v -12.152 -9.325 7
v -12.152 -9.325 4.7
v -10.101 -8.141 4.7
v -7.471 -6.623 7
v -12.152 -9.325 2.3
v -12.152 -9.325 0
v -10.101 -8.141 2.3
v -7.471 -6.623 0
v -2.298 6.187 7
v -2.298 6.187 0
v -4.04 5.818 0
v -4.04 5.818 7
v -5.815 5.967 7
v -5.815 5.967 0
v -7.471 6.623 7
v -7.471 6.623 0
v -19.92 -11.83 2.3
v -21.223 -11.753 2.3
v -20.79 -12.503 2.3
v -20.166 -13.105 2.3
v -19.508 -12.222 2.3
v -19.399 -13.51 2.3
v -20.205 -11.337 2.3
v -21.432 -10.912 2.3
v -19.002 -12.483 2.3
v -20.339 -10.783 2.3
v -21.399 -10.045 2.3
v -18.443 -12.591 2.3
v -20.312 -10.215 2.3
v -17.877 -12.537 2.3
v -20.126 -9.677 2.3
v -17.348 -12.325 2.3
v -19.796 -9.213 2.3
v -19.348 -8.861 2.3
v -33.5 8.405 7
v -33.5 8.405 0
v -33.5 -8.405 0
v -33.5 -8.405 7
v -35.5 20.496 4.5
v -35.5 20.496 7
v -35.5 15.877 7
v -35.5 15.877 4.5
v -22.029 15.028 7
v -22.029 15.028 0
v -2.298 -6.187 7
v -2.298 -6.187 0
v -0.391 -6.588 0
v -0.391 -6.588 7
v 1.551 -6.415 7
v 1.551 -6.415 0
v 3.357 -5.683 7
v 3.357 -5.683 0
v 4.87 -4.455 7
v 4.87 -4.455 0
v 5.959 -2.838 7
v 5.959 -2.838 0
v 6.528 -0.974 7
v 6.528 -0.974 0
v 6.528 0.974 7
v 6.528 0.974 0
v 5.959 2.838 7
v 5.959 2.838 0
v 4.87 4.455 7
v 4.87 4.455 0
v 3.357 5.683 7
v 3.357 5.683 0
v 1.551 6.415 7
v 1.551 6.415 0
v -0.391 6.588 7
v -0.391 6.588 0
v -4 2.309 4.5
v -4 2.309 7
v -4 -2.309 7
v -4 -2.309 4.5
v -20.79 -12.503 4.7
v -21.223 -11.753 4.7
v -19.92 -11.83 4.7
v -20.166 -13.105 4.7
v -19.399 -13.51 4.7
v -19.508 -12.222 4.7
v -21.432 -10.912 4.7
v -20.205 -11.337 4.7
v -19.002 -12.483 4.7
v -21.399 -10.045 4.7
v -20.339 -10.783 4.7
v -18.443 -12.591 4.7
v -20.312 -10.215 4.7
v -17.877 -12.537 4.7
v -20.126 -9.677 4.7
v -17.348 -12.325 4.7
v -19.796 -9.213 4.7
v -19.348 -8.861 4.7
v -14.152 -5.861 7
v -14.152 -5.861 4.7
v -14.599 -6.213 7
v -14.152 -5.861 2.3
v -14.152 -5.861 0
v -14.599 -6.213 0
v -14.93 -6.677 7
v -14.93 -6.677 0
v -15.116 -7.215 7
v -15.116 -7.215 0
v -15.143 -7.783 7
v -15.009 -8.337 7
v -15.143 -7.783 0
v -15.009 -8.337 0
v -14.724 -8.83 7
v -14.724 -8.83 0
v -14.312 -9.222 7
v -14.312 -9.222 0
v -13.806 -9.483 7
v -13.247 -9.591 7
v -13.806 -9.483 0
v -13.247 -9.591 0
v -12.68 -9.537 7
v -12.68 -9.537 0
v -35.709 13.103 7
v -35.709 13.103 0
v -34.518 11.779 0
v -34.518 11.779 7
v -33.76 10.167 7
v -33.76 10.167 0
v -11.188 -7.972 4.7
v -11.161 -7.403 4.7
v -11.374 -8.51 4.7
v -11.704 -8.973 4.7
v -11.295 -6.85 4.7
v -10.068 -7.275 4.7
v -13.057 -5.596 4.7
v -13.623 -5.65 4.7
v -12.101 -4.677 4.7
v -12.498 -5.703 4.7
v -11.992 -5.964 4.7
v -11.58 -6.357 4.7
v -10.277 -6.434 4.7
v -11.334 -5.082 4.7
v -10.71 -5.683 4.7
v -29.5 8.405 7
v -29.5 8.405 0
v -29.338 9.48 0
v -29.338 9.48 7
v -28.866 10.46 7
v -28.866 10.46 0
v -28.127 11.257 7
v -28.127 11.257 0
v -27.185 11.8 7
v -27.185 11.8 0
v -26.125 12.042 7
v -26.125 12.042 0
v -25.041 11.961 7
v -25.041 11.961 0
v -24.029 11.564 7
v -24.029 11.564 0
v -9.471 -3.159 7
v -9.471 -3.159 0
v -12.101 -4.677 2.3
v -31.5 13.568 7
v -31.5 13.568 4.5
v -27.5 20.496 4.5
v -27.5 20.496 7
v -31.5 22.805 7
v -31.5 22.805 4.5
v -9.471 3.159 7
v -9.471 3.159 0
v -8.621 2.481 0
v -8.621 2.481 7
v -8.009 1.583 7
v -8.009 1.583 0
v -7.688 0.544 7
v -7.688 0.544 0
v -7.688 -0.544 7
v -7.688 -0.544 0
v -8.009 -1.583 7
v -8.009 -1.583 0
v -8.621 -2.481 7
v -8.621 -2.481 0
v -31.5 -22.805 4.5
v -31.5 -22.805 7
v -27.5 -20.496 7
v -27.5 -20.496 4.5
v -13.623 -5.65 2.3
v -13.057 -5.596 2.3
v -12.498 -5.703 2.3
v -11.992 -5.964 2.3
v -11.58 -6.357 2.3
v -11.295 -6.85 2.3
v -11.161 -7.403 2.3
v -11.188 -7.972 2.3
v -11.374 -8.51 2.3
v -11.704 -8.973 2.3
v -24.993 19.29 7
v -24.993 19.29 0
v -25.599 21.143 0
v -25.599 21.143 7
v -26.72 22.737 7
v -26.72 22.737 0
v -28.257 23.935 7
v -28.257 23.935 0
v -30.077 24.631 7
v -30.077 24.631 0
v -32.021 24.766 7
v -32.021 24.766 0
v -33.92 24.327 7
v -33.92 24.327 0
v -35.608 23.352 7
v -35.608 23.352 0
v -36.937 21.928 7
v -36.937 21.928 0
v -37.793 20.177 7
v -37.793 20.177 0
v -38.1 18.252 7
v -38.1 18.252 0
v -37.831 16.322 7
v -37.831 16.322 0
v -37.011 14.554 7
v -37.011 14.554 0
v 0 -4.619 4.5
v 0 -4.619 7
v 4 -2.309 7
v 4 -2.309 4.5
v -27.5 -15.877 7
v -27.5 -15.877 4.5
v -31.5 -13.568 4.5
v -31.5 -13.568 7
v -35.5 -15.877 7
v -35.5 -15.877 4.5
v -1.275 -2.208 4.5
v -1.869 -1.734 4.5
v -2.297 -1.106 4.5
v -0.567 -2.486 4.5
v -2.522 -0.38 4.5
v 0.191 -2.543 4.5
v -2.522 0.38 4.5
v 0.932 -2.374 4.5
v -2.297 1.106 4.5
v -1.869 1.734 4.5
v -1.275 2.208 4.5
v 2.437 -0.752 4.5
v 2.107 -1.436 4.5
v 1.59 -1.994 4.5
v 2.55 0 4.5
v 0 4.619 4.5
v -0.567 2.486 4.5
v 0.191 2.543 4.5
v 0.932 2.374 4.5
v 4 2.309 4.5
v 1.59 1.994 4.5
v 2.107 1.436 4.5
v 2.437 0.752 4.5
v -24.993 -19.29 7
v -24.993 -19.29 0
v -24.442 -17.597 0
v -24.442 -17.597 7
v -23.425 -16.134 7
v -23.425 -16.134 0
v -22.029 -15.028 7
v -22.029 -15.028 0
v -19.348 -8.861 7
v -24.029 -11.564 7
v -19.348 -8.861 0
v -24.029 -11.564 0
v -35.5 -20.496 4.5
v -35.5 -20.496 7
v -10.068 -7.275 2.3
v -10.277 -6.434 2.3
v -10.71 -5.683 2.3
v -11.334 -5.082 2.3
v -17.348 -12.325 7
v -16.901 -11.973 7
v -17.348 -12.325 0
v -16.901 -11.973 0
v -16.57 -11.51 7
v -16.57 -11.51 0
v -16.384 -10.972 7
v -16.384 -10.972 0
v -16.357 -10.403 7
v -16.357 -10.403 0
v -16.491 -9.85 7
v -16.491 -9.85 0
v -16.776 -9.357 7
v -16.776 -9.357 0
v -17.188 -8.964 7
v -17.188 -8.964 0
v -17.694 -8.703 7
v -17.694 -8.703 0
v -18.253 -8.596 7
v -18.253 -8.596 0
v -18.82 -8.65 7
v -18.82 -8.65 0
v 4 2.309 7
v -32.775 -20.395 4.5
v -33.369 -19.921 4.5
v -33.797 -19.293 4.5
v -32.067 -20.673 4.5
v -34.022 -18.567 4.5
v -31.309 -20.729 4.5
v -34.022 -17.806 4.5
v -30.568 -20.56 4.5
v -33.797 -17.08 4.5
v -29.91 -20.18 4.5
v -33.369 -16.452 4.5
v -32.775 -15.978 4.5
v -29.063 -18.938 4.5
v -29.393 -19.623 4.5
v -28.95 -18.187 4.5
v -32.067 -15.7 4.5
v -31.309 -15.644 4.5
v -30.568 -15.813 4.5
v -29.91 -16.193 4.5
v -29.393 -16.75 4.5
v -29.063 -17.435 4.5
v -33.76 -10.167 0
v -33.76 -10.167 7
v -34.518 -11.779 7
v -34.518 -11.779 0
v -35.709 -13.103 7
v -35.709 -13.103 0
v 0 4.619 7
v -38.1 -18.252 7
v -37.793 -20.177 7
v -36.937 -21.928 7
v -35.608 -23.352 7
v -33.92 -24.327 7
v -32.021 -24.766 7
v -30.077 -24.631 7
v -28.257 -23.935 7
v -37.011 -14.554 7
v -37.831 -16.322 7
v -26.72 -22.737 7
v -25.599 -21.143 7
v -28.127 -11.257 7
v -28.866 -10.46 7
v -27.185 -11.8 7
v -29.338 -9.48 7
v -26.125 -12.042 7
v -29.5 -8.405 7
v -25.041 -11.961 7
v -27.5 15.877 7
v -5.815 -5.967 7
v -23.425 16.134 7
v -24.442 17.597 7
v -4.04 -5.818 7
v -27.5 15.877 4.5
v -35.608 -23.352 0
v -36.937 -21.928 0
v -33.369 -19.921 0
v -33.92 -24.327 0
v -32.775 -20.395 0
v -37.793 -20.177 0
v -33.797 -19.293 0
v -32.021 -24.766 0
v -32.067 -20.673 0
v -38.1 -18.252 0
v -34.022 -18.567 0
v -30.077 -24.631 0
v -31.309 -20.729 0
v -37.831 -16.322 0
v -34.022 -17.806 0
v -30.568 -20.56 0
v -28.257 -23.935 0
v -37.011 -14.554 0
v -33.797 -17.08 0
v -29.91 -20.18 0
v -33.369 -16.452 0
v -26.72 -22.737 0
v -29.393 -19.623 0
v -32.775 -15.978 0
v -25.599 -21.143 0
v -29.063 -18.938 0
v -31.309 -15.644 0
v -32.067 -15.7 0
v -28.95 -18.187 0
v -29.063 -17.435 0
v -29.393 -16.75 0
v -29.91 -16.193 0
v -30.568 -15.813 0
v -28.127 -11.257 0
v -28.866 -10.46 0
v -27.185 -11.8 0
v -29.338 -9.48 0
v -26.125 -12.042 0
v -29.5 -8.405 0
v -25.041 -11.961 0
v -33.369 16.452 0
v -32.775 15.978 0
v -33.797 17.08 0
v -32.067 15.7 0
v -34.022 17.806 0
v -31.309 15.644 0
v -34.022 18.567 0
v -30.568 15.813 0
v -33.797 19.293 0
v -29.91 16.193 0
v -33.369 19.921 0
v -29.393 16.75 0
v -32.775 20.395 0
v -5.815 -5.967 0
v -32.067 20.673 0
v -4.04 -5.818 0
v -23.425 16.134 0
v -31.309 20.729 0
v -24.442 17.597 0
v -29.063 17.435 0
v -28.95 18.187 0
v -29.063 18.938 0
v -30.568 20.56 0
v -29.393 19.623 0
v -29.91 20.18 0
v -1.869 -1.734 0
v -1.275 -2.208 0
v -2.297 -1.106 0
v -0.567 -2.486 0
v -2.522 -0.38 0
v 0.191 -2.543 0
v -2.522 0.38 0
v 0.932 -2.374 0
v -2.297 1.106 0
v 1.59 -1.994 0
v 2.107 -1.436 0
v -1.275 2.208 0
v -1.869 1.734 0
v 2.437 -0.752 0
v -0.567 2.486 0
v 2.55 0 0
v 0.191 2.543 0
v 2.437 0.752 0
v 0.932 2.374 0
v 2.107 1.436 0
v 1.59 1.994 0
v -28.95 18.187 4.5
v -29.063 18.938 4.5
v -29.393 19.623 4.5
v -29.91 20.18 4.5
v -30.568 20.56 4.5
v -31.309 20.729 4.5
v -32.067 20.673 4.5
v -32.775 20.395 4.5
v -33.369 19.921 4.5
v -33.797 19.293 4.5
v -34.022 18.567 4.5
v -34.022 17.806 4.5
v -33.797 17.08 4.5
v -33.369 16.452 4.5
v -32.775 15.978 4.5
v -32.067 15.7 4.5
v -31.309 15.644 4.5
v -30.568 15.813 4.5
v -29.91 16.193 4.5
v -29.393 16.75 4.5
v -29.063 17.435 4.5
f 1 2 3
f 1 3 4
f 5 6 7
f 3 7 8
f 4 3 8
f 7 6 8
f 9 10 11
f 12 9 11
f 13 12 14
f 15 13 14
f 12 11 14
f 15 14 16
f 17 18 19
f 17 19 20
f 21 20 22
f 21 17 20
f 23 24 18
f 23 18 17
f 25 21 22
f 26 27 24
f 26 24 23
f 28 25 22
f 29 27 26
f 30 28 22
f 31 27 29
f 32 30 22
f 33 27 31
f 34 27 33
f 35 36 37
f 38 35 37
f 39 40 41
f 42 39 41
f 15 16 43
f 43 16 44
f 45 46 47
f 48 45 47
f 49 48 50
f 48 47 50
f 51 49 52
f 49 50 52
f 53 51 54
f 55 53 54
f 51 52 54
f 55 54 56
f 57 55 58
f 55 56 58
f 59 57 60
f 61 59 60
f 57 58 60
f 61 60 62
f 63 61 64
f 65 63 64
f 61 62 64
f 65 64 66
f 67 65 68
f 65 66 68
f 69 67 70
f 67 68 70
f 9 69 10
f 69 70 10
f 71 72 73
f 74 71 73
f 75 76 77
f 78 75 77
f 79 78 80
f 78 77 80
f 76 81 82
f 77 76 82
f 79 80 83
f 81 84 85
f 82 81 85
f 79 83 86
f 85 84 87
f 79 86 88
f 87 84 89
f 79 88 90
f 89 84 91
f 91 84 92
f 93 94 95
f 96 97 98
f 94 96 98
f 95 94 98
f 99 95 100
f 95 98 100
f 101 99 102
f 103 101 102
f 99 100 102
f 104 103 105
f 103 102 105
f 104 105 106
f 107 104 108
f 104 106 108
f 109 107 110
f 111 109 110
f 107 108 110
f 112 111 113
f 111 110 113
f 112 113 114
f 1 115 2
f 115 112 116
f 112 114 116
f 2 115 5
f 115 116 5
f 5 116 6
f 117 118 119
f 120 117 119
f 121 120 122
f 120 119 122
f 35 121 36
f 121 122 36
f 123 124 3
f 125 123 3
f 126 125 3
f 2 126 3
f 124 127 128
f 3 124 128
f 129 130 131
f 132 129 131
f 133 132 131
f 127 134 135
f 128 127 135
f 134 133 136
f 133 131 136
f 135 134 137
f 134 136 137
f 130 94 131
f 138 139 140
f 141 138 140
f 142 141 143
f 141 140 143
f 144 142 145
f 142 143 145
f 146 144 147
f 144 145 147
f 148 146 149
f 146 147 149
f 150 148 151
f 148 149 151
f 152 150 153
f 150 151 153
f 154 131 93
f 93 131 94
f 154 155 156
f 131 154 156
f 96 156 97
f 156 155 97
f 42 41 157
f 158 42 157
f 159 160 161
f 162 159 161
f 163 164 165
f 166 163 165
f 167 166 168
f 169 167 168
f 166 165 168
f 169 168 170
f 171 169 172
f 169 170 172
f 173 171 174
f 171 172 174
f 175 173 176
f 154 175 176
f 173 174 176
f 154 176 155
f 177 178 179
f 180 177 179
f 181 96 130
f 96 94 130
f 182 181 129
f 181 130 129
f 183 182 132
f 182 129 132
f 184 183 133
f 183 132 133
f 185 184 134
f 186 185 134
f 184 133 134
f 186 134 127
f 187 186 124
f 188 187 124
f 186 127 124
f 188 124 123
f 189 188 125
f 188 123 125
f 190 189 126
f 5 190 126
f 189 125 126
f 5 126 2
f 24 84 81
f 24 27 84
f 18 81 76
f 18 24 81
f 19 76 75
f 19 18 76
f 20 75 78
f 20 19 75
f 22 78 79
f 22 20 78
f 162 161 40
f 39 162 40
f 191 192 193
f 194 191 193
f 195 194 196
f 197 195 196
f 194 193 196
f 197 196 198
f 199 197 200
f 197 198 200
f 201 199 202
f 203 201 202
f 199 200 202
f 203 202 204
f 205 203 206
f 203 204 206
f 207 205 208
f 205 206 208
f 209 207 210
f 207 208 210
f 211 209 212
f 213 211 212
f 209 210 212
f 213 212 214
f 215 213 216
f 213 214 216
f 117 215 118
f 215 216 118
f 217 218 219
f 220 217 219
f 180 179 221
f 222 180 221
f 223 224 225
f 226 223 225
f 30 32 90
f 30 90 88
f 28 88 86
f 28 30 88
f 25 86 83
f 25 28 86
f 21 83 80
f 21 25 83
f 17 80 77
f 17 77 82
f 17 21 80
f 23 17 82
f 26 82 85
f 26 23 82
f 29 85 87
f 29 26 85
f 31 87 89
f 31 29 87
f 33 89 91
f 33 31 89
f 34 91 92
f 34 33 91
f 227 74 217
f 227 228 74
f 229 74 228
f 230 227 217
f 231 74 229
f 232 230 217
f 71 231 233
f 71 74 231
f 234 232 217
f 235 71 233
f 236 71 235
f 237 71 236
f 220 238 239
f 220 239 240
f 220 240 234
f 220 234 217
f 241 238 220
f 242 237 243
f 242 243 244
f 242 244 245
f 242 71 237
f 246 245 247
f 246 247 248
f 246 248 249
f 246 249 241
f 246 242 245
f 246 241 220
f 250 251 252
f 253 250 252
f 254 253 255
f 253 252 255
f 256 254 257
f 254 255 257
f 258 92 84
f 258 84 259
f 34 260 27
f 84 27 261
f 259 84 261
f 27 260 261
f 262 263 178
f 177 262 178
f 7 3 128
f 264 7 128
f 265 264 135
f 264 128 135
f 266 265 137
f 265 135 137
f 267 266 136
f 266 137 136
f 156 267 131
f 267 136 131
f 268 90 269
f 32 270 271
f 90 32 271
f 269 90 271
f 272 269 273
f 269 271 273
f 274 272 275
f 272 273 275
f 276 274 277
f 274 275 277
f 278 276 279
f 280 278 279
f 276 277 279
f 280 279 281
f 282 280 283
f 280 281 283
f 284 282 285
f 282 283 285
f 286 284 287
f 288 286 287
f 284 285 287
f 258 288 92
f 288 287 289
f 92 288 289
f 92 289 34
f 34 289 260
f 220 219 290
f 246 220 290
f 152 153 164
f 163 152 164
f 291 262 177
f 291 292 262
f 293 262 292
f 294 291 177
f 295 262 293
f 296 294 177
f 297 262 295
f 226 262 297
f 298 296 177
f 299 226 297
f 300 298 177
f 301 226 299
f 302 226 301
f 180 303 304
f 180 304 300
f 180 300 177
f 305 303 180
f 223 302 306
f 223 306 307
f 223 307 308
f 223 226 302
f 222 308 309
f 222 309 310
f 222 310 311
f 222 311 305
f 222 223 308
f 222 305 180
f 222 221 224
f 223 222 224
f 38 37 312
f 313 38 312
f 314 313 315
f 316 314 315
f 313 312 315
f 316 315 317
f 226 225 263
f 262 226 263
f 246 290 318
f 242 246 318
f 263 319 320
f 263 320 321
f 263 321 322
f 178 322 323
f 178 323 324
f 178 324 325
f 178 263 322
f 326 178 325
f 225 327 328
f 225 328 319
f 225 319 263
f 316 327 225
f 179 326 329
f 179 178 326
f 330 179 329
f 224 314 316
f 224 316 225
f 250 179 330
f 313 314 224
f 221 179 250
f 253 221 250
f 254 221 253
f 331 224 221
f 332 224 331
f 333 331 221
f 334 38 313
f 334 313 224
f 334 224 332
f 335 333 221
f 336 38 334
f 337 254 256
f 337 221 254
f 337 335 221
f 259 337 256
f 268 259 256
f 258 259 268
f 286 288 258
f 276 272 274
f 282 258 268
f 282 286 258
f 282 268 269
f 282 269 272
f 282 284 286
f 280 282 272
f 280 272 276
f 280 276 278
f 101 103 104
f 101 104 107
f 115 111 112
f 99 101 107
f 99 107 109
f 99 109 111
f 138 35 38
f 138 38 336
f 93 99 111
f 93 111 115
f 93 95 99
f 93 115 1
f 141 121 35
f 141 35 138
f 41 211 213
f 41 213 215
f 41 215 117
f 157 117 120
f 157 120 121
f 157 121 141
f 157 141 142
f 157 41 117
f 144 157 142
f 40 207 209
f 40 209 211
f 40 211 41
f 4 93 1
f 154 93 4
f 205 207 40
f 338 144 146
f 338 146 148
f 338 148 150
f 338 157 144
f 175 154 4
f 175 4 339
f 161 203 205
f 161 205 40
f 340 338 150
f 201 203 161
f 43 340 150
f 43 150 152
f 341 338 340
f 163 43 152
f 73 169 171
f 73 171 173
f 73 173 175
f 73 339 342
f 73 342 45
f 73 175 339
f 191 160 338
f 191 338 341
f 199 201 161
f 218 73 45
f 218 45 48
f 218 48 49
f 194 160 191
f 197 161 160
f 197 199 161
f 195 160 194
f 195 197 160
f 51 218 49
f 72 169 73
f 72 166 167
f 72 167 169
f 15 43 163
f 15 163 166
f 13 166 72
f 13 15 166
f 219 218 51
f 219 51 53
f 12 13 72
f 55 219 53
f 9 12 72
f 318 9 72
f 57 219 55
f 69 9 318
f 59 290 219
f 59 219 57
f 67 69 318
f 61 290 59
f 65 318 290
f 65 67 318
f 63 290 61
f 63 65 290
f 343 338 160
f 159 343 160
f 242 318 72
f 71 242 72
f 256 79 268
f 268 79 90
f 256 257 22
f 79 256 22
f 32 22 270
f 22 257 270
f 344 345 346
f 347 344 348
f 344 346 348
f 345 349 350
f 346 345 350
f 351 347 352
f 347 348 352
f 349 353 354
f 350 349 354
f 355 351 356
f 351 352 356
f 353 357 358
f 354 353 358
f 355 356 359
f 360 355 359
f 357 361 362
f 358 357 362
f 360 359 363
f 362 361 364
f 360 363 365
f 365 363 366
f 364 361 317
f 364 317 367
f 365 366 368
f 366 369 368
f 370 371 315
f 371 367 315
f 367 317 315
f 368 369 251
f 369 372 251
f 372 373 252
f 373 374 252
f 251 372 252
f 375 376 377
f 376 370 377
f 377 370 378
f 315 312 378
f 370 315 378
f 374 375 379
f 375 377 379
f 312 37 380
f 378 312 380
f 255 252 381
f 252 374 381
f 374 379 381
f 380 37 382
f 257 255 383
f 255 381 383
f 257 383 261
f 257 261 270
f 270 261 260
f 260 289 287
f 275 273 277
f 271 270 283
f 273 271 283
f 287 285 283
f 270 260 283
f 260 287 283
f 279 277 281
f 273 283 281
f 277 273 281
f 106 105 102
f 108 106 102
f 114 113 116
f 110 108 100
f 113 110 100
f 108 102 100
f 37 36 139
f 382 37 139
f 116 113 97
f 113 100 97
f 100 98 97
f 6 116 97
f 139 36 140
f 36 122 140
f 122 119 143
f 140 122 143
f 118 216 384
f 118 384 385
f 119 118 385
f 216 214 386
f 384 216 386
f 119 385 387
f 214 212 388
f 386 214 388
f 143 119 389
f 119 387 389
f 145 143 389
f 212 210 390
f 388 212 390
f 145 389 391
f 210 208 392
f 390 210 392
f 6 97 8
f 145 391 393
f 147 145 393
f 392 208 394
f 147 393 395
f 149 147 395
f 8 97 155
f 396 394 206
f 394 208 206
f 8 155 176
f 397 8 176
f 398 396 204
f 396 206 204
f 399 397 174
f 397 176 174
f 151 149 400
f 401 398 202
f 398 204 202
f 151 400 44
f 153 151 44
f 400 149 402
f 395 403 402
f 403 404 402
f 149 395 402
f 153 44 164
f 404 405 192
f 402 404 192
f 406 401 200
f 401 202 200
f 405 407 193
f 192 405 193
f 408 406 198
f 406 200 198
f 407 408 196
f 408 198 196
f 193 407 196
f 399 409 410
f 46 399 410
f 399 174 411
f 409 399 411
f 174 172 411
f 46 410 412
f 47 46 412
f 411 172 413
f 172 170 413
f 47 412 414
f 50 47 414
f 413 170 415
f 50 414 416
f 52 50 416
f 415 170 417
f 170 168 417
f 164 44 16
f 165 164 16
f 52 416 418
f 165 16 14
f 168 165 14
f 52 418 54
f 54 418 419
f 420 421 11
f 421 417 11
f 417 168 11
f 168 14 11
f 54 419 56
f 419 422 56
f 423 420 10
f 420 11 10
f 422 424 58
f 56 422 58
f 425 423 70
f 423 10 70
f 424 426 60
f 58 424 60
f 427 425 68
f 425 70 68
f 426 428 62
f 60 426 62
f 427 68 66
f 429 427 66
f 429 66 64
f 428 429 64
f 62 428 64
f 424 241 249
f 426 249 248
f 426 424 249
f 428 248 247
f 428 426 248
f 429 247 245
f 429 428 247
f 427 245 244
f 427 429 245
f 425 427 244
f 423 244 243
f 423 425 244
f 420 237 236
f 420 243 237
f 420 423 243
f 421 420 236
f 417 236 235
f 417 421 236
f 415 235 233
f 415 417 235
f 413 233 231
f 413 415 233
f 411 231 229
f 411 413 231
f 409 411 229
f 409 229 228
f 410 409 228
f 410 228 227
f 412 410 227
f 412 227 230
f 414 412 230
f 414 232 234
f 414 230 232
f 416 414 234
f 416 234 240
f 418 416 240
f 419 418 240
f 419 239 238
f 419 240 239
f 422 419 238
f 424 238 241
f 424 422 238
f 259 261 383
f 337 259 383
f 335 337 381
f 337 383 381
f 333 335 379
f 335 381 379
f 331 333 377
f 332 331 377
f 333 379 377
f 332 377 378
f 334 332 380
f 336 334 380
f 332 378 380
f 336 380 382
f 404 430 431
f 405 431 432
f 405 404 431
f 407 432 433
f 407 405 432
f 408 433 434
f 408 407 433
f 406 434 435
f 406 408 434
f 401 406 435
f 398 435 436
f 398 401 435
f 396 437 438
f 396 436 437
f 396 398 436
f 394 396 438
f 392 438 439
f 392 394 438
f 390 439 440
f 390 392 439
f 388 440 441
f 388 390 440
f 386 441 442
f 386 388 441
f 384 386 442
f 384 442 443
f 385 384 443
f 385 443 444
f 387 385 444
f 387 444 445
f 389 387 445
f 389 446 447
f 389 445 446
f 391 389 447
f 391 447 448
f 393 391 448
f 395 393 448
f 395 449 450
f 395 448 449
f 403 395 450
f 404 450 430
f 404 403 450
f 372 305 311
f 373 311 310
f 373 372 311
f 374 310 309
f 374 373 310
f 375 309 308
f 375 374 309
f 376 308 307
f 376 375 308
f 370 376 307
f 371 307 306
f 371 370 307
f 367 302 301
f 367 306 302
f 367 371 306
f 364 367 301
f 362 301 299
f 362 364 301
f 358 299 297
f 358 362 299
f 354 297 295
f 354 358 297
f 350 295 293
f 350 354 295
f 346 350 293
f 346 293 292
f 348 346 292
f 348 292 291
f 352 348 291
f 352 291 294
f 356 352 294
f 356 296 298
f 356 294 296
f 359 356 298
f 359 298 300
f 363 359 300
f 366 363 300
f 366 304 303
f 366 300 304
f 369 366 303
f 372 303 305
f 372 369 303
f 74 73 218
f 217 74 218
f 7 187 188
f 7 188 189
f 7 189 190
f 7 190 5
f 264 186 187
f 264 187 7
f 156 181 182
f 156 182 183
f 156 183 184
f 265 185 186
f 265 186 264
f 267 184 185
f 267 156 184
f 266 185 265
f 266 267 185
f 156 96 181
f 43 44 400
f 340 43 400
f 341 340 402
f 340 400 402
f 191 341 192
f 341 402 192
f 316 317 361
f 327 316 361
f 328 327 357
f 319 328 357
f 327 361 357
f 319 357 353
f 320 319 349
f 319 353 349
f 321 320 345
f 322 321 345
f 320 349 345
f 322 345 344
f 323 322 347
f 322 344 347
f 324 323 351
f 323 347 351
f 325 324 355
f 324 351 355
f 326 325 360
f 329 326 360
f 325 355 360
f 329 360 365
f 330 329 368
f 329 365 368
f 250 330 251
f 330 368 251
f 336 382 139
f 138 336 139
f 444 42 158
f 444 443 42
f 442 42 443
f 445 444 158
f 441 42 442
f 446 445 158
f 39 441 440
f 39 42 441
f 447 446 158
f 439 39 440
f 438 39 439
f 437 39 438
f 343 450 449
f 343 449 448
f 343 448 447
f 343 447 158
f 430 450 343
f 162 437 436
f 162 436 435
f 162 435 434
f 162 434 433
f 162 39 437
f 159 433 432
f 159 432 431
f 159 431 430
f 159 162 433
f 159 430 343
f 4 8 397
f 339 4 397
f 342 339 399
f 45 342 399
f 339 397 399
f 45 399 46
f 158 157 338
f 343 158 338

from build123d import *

# Parameters (mm, degrees)
F0_R     = 2.55
F1_DEPTH = 7
F3_DEPTH = 2.5
F6_DEPTH = 1.2


with BuildPart() as f1:
    # F0 (on Top) → F1 (new body)
    with BuildSketch(Plane.XY):
        with BuildLine():
            ThreePointArc((-22.0288725662, 15.0277765828), (-23.9870436526, 16.827971802), (-24.9929573966, 19.2903434982))
            ThreePointArc((-24.9929573966, 19.2903434982), (-34.8, 23.9023011445), (-35.7094488189, 13.1031742908))
            ThreePointArc((-35.7094488189, 13.1031742908), (-34.0799292484, 11.0008415863), (-33.5, 8.404918071))
            Line((-33.5, 8.404918071), (-33.5, -8.404918071))
            ThreePointArc((-33.5, -8.404918071), (-34.0799292484, -11.0008415863), (-35.7094488189, -13.1031742908))
            ThreePointArc((-35.7094488189, -13.1031742908), (-34.8, -23.9023011445), (-24.9929573966, -19.2903434982))
            ThreePointArc((-24.9929573966, -19.2903434982), (-23.9870430876, -16.8279709896), (-22.0288708522, -15.0277755932))
            Line((-22.0288708522, -15.0277755932), (-17.348076829, -12.3253179039))
            ThreePointArc((-17.348076829, -12.3253179039), (-16.6160260214, -9.5932670963), (-19.348076829, -8.8612162887))
            Line((-19.348076829, -8.8612162887), (-24.0288708522, -11.5636739781))
            ThreePointArc((-24.0288708522, -11.5636739781), (-27.6762899984, -11.5636754624), (-29.5, -8.404918071))
            Line((-29.5, -8.404918071), (-29.5, 8.404918071))
            ThreePointArc((-29.5, 8.404918071), (-27.6762908554, 11.5636749676), (-24.0288725662, 11.5636749676))
            Line((-24.0288725662, 11.5636749676), (-9.4711274338, 3.1587568967))
            ThreePointArc((-9.4711274338, 3.1587568967), (-7.6474182892, -9.615e-07), (-9.4711290992, -3.1587578582))
            Line((-9.4711290992, -3.1587578582), (-14.1519236685, -5.8612158628))
            ThreePointArc((-14.1519236685, -5.8612158628), (-14.8839746302, -8.5932681071), (-12.1519222705, -9.3253186383))
            Line((-12.1519222705, -9.3253186383), (-7.4711290992, -6.6228594733))
            ThreePointArc((-7.4711290992, -6.6228594733), (-4.9330280571, -5.8271302964), (-2.2975937845, -6.1871692074))
            ThreePointArc((-2.2975937845, -6.1871692074), (6.6, 0), (-2.2975937845, 6.1871692074))
            ThreePointArc((-2.2975937845, 6.1871692074), (-4.933027099, 5.8271302157), (-7.4711274338, 6.6228585118))
            Line((-7.4711274338, 6.6228585118), (-22.0288725662, 15.0277765828))
        make_face()
        with Locations((-31.5, -18.1865334795)):
            Circle(F0_R, mode=Mode.SUBTRACT)
        with Locations((-31.5, 18.1865334795)):
            Circle(F0_R, mode=Mode.SUBTRACT)
        Circle(F0_R, mode=Mode.SUBTRACT)
    extrude(amount=F1_DEPTH)

    # F2 (on face) → F3 (cut)
    with BuildSketch(Plane.XY.offset(7)):
        Polygon((-27.5, 15.8771324027), (-27.5, 20.4959345562), (-31.5, 22.805335633), (-35.5, 20.4959345562), (-35.5, 15.8771324027), (-31.5, 13.567731326), align=None)
        Polygon((-27.5, -20.4959345562), (-27.5, -15.8771324027), (-31.5, -13.567731326), (-35.5, -15.8771324027), (-35.5, -20.4959345562), (-31.5, -22.805335633), align=None)
        Polygon((-4, 2.3094010768), (-4, -2.3094010768), (0, -4.6188021535), (4, -2.3094010768), (4, 2.3094010768), (0, 4.6188021535), align=None)
    extrude(amount=-F3_DEPTH, mode=Mode.SUBTRACT)

    # F5 (on mid) → F6 (cut, symmetric)
    with BuildSketch(Plane.XY.offset(3.5)):
        with BuildLine():
            Line((-19.348076829, -8.8612162887), (-21.3992959786, -10.045488217))
            ThreePointArc((-21.3992959786, -10.045488217), (-21.0327555807, -12.1432670963), (-19.3992959786, -13.5095898321))
            Line((-19.3992959786, -13.5095898321), (-17.348076829, -12.3253179039))
            ThreePointArc((-17.348076829, -12.3253179039), (-20.0801276365, -11.5932670963), (-19.348076829, -8.8612162887))
        make_face()
        with BuildLine():
            ThreePointArc((-14.1519236685, -5.8612158628), (-11.4198718547, -6.5932667092), (-12.1519222705, -9.3253186383))
            Line((-12.1519222705, -9.3253186383), (-10.1007041172, -8.1410464231))
            ThreePointArc((-10.1007041172, -8.1410464231), (-10.4672447351, -6.043266985), (-12.1007051418, -4.6769442942))
            Line((-12.1007051418, -4.6769442942), (-14.1519236685, -5.8612158628))
        make_face()
    extrude(amount=F6_DEPTH, both=True, mode=Mode.SUBTRACT)


solid = f1.part
